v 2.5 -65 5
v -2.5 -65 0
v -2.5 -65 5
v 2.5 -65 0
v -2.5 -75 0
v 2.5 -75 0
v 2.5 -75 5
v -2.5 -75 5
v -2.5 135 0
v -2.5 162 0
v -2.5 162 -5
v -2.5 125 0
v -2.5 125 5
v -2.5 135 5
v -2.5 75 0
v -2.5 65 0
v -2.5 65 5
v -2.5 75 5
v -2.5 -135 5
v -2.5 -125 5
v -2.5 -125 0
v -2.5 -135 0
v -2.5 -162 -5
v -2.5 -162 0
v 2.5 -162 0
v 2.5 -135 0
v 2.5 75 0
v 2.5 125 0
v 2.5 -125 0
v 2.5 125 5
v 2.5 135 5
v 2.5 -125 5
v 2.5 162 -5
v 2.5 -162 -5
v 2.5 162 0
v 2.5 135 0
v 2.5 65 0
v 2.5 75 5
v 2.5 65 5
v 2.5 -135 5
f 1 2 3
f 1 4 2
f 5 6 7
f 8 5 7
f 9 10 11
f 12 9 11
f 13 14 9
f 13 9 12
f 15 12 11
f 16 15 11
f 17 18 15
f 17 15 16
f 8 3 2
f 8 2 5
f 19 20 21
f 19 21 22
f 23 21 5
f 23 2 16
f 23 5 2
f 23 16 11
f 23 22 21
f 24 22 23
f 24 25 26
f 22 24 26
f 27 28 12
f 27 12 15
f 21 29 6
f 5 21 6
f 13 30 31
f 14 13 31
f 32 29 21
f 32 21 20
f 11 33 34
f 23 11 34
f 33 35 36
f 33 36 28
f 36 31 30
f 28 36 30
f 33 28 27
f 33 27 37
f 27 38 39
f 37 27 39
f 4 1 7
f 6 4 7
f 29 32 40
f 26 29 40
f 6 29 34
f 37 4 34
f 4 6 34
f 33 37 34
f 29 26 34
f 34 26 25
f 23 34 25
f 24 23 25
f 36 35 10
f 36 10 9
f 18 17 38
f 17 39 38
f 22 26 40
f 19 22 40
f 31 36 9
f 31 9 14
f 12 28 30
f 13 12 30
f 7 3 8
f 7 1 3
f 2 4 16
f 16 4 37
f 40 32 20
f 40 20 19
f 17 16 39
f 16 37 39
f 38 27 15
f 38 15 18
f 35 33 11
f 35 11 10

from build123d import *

# Parameters (mm, degrees)
SKETCH1_W           = 10
SKETCH1_H           = 5
BOSS_EXTRUDE1_DEPTH = 2.5


with BuildPart() as part:
    # Sketch1 → Boss-Extrude1 (new, symmetric)
    with BuildSketch(Plane.YZ):
        Polygon((75, 0), (65, 0), (0, 0), (0, -5), (162, -5), (162, 0), (135, 0), (125, 0), align=None)
        with Locations((70, 2.5)):
            Rectangle(SKETCH1_W, SKETCH1_H)
        with Locations((130, 2.5)):
            Rectangle(SKETCH1_W, SKETCH1_H)
    boss_extrude1 = extrude(amount=BOSS_EXTRUDE1_DEPTH, both=True)

    # Mirror1: Boss-Extrude1 across plane
    add(boss_extrude1.mirror(Plane.ZX))


solid = part.part
